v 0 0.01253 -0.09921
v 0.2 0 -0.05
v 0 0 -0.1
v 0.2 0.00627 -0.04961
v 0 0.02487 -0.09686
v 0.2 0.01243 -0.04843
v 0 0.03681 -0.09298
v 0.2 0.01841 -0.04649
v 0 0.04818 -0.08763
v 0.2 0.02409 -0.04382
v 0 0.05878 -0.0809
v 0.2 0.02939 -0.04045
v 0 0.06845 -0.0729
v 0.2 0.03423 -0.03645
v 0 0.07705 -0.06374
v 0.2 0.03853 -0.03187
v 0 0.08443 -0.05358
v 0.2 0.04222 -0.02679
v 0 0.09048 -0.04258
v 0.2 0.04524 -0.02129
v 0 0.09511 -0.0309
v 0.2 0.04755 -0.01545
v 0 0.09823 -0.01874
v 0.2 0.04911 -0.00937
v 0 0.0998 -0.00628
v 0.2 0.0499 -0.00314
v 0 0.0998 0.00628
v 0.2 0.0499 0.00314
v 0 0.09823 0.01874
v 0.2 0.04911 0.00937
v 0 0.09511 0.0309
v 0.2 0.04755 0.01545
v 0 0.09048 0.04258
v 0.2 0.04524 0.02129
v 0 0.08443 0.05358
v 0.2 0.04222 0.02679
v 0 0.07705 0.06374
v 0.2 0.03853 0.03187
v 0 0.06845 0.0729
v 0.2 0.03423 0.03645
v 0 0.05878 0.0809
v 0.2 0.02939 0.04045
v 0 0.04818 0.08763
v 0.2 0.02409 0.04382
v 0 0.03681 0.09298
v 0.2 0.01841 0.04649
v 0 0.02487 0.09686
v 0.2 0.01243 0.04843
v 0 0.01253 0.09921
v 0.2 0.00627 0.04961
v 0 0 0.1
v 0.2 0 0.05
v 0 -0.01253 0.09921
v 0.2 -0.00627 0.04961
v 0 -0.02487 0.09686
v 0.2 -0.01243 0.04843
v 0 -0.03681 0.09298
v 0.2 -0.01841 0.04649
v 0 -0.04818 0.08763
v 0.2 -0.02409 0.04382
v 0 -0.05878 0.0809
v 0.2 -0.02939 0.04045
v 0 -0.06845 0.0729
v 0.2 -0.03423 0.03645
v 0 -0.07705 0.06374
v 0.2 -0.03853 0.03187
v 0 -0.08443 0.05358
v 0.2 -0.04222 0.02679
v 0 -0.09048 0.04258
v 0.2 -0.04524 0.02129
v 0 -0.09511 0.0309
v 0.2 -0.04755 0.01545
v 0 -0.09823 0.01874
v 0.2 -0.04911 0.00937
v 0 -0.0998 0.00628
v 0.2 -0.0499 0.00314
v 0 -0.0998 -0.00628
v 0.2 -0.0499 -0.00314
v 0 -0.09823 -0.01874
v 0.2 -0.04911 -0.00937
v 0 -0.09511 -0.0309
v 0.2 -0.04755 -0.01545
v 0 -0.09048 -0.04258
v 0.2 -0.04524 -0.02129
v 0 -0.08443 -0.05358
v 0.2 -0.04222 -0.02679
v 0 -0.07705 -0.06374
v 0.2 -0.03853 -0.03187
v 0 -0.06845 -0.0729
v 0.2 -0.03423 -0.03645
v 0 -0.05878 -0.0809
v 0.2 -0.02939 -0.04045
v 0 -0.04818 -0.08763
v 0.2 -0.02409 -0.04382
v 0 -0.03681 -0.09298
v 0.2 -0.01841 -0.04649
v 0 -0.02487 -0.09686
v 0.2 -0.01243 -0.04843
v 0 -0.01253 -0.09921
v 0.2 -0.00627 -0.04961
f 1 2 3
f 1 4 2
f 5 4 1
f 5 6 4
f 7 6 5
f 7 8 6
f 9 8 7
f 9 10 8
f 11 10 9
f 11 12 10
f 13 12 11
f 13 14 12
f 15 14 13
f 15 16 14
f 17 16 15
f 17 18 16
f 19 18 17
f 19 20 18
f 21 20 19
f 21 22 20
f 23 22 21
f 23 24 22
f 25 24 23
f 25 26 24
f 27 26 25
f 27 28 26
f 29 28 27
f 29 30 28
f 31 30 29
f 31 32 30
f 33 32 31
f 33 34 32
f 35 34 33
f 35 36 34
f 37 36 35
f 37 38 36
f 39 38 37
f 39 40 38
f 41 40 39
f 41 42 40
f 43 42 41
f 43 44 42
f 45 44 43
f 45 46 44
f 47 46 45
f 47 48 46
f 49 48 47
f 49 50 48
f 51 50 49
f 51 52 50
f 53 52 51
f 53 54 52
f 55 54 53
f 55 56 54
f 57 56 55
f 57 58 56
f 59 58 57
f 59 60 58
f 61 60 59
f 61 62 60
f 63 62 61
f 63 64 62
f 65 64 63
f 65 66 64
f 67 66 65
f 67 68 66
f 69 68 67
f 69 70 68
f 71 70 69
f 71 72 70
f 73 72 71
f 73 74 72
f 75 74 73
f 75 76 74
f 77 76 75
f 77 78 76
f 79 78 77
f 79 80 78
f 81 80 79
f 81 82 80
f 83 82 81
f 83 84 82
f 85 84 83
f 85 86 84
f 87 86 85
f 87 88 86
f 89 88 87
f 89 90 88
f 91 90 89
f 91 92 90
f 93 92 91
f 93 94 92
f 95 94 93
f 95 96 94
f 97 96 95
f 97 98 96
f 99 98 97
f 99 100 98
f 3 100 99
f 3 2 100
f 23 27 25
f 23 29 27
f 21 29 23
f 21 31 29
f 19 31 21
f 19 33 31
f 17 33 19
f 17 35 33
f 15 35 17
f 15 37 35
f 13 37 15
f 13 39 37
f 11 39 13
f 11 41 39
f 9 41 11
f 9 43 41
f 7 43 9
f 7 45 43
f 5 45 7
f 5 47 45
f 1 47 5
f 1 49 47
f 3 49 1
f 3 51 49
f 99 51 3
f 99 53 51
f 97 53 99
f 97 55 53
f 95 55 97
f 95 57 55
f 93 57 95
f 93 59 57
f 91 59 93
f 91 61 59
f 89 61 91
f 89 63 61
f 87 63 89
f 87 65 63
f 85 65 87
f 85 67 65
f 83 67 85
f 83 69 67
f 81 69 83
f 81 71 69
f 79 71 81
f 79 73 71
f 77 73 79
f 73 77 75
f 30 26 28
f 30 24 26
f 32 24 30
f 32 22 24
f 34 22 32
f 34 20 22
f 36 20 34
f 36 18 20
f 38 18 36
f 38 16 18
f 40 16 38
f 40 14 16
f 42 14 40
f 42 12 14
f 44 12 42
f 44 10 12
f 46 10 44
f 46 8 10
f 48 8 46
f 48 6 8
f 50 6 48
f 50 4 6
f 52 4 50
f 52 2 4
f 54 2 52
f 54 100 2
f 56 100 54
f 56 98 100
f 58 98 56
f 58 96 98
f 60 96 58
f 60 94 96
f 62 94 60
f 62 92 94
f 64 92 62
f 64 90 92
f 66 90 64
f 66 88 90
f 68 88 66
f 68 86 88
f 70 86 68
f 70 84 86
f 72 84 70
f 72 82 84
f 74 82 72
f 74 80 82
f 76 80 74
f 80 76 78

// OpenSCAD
$fn=50;  // REMOVE
LENGTH = 1;  // REMOVE
DO = 0.2; // REMOVE
PARAM1 = 0.1; // REMOVE
rotate([0, 90, 0])
translate([0, 0, (DO)/2])
cylinder(h = (DO), r1 = (DO)/2, r2 = (PARAM1)/2, center = true);
